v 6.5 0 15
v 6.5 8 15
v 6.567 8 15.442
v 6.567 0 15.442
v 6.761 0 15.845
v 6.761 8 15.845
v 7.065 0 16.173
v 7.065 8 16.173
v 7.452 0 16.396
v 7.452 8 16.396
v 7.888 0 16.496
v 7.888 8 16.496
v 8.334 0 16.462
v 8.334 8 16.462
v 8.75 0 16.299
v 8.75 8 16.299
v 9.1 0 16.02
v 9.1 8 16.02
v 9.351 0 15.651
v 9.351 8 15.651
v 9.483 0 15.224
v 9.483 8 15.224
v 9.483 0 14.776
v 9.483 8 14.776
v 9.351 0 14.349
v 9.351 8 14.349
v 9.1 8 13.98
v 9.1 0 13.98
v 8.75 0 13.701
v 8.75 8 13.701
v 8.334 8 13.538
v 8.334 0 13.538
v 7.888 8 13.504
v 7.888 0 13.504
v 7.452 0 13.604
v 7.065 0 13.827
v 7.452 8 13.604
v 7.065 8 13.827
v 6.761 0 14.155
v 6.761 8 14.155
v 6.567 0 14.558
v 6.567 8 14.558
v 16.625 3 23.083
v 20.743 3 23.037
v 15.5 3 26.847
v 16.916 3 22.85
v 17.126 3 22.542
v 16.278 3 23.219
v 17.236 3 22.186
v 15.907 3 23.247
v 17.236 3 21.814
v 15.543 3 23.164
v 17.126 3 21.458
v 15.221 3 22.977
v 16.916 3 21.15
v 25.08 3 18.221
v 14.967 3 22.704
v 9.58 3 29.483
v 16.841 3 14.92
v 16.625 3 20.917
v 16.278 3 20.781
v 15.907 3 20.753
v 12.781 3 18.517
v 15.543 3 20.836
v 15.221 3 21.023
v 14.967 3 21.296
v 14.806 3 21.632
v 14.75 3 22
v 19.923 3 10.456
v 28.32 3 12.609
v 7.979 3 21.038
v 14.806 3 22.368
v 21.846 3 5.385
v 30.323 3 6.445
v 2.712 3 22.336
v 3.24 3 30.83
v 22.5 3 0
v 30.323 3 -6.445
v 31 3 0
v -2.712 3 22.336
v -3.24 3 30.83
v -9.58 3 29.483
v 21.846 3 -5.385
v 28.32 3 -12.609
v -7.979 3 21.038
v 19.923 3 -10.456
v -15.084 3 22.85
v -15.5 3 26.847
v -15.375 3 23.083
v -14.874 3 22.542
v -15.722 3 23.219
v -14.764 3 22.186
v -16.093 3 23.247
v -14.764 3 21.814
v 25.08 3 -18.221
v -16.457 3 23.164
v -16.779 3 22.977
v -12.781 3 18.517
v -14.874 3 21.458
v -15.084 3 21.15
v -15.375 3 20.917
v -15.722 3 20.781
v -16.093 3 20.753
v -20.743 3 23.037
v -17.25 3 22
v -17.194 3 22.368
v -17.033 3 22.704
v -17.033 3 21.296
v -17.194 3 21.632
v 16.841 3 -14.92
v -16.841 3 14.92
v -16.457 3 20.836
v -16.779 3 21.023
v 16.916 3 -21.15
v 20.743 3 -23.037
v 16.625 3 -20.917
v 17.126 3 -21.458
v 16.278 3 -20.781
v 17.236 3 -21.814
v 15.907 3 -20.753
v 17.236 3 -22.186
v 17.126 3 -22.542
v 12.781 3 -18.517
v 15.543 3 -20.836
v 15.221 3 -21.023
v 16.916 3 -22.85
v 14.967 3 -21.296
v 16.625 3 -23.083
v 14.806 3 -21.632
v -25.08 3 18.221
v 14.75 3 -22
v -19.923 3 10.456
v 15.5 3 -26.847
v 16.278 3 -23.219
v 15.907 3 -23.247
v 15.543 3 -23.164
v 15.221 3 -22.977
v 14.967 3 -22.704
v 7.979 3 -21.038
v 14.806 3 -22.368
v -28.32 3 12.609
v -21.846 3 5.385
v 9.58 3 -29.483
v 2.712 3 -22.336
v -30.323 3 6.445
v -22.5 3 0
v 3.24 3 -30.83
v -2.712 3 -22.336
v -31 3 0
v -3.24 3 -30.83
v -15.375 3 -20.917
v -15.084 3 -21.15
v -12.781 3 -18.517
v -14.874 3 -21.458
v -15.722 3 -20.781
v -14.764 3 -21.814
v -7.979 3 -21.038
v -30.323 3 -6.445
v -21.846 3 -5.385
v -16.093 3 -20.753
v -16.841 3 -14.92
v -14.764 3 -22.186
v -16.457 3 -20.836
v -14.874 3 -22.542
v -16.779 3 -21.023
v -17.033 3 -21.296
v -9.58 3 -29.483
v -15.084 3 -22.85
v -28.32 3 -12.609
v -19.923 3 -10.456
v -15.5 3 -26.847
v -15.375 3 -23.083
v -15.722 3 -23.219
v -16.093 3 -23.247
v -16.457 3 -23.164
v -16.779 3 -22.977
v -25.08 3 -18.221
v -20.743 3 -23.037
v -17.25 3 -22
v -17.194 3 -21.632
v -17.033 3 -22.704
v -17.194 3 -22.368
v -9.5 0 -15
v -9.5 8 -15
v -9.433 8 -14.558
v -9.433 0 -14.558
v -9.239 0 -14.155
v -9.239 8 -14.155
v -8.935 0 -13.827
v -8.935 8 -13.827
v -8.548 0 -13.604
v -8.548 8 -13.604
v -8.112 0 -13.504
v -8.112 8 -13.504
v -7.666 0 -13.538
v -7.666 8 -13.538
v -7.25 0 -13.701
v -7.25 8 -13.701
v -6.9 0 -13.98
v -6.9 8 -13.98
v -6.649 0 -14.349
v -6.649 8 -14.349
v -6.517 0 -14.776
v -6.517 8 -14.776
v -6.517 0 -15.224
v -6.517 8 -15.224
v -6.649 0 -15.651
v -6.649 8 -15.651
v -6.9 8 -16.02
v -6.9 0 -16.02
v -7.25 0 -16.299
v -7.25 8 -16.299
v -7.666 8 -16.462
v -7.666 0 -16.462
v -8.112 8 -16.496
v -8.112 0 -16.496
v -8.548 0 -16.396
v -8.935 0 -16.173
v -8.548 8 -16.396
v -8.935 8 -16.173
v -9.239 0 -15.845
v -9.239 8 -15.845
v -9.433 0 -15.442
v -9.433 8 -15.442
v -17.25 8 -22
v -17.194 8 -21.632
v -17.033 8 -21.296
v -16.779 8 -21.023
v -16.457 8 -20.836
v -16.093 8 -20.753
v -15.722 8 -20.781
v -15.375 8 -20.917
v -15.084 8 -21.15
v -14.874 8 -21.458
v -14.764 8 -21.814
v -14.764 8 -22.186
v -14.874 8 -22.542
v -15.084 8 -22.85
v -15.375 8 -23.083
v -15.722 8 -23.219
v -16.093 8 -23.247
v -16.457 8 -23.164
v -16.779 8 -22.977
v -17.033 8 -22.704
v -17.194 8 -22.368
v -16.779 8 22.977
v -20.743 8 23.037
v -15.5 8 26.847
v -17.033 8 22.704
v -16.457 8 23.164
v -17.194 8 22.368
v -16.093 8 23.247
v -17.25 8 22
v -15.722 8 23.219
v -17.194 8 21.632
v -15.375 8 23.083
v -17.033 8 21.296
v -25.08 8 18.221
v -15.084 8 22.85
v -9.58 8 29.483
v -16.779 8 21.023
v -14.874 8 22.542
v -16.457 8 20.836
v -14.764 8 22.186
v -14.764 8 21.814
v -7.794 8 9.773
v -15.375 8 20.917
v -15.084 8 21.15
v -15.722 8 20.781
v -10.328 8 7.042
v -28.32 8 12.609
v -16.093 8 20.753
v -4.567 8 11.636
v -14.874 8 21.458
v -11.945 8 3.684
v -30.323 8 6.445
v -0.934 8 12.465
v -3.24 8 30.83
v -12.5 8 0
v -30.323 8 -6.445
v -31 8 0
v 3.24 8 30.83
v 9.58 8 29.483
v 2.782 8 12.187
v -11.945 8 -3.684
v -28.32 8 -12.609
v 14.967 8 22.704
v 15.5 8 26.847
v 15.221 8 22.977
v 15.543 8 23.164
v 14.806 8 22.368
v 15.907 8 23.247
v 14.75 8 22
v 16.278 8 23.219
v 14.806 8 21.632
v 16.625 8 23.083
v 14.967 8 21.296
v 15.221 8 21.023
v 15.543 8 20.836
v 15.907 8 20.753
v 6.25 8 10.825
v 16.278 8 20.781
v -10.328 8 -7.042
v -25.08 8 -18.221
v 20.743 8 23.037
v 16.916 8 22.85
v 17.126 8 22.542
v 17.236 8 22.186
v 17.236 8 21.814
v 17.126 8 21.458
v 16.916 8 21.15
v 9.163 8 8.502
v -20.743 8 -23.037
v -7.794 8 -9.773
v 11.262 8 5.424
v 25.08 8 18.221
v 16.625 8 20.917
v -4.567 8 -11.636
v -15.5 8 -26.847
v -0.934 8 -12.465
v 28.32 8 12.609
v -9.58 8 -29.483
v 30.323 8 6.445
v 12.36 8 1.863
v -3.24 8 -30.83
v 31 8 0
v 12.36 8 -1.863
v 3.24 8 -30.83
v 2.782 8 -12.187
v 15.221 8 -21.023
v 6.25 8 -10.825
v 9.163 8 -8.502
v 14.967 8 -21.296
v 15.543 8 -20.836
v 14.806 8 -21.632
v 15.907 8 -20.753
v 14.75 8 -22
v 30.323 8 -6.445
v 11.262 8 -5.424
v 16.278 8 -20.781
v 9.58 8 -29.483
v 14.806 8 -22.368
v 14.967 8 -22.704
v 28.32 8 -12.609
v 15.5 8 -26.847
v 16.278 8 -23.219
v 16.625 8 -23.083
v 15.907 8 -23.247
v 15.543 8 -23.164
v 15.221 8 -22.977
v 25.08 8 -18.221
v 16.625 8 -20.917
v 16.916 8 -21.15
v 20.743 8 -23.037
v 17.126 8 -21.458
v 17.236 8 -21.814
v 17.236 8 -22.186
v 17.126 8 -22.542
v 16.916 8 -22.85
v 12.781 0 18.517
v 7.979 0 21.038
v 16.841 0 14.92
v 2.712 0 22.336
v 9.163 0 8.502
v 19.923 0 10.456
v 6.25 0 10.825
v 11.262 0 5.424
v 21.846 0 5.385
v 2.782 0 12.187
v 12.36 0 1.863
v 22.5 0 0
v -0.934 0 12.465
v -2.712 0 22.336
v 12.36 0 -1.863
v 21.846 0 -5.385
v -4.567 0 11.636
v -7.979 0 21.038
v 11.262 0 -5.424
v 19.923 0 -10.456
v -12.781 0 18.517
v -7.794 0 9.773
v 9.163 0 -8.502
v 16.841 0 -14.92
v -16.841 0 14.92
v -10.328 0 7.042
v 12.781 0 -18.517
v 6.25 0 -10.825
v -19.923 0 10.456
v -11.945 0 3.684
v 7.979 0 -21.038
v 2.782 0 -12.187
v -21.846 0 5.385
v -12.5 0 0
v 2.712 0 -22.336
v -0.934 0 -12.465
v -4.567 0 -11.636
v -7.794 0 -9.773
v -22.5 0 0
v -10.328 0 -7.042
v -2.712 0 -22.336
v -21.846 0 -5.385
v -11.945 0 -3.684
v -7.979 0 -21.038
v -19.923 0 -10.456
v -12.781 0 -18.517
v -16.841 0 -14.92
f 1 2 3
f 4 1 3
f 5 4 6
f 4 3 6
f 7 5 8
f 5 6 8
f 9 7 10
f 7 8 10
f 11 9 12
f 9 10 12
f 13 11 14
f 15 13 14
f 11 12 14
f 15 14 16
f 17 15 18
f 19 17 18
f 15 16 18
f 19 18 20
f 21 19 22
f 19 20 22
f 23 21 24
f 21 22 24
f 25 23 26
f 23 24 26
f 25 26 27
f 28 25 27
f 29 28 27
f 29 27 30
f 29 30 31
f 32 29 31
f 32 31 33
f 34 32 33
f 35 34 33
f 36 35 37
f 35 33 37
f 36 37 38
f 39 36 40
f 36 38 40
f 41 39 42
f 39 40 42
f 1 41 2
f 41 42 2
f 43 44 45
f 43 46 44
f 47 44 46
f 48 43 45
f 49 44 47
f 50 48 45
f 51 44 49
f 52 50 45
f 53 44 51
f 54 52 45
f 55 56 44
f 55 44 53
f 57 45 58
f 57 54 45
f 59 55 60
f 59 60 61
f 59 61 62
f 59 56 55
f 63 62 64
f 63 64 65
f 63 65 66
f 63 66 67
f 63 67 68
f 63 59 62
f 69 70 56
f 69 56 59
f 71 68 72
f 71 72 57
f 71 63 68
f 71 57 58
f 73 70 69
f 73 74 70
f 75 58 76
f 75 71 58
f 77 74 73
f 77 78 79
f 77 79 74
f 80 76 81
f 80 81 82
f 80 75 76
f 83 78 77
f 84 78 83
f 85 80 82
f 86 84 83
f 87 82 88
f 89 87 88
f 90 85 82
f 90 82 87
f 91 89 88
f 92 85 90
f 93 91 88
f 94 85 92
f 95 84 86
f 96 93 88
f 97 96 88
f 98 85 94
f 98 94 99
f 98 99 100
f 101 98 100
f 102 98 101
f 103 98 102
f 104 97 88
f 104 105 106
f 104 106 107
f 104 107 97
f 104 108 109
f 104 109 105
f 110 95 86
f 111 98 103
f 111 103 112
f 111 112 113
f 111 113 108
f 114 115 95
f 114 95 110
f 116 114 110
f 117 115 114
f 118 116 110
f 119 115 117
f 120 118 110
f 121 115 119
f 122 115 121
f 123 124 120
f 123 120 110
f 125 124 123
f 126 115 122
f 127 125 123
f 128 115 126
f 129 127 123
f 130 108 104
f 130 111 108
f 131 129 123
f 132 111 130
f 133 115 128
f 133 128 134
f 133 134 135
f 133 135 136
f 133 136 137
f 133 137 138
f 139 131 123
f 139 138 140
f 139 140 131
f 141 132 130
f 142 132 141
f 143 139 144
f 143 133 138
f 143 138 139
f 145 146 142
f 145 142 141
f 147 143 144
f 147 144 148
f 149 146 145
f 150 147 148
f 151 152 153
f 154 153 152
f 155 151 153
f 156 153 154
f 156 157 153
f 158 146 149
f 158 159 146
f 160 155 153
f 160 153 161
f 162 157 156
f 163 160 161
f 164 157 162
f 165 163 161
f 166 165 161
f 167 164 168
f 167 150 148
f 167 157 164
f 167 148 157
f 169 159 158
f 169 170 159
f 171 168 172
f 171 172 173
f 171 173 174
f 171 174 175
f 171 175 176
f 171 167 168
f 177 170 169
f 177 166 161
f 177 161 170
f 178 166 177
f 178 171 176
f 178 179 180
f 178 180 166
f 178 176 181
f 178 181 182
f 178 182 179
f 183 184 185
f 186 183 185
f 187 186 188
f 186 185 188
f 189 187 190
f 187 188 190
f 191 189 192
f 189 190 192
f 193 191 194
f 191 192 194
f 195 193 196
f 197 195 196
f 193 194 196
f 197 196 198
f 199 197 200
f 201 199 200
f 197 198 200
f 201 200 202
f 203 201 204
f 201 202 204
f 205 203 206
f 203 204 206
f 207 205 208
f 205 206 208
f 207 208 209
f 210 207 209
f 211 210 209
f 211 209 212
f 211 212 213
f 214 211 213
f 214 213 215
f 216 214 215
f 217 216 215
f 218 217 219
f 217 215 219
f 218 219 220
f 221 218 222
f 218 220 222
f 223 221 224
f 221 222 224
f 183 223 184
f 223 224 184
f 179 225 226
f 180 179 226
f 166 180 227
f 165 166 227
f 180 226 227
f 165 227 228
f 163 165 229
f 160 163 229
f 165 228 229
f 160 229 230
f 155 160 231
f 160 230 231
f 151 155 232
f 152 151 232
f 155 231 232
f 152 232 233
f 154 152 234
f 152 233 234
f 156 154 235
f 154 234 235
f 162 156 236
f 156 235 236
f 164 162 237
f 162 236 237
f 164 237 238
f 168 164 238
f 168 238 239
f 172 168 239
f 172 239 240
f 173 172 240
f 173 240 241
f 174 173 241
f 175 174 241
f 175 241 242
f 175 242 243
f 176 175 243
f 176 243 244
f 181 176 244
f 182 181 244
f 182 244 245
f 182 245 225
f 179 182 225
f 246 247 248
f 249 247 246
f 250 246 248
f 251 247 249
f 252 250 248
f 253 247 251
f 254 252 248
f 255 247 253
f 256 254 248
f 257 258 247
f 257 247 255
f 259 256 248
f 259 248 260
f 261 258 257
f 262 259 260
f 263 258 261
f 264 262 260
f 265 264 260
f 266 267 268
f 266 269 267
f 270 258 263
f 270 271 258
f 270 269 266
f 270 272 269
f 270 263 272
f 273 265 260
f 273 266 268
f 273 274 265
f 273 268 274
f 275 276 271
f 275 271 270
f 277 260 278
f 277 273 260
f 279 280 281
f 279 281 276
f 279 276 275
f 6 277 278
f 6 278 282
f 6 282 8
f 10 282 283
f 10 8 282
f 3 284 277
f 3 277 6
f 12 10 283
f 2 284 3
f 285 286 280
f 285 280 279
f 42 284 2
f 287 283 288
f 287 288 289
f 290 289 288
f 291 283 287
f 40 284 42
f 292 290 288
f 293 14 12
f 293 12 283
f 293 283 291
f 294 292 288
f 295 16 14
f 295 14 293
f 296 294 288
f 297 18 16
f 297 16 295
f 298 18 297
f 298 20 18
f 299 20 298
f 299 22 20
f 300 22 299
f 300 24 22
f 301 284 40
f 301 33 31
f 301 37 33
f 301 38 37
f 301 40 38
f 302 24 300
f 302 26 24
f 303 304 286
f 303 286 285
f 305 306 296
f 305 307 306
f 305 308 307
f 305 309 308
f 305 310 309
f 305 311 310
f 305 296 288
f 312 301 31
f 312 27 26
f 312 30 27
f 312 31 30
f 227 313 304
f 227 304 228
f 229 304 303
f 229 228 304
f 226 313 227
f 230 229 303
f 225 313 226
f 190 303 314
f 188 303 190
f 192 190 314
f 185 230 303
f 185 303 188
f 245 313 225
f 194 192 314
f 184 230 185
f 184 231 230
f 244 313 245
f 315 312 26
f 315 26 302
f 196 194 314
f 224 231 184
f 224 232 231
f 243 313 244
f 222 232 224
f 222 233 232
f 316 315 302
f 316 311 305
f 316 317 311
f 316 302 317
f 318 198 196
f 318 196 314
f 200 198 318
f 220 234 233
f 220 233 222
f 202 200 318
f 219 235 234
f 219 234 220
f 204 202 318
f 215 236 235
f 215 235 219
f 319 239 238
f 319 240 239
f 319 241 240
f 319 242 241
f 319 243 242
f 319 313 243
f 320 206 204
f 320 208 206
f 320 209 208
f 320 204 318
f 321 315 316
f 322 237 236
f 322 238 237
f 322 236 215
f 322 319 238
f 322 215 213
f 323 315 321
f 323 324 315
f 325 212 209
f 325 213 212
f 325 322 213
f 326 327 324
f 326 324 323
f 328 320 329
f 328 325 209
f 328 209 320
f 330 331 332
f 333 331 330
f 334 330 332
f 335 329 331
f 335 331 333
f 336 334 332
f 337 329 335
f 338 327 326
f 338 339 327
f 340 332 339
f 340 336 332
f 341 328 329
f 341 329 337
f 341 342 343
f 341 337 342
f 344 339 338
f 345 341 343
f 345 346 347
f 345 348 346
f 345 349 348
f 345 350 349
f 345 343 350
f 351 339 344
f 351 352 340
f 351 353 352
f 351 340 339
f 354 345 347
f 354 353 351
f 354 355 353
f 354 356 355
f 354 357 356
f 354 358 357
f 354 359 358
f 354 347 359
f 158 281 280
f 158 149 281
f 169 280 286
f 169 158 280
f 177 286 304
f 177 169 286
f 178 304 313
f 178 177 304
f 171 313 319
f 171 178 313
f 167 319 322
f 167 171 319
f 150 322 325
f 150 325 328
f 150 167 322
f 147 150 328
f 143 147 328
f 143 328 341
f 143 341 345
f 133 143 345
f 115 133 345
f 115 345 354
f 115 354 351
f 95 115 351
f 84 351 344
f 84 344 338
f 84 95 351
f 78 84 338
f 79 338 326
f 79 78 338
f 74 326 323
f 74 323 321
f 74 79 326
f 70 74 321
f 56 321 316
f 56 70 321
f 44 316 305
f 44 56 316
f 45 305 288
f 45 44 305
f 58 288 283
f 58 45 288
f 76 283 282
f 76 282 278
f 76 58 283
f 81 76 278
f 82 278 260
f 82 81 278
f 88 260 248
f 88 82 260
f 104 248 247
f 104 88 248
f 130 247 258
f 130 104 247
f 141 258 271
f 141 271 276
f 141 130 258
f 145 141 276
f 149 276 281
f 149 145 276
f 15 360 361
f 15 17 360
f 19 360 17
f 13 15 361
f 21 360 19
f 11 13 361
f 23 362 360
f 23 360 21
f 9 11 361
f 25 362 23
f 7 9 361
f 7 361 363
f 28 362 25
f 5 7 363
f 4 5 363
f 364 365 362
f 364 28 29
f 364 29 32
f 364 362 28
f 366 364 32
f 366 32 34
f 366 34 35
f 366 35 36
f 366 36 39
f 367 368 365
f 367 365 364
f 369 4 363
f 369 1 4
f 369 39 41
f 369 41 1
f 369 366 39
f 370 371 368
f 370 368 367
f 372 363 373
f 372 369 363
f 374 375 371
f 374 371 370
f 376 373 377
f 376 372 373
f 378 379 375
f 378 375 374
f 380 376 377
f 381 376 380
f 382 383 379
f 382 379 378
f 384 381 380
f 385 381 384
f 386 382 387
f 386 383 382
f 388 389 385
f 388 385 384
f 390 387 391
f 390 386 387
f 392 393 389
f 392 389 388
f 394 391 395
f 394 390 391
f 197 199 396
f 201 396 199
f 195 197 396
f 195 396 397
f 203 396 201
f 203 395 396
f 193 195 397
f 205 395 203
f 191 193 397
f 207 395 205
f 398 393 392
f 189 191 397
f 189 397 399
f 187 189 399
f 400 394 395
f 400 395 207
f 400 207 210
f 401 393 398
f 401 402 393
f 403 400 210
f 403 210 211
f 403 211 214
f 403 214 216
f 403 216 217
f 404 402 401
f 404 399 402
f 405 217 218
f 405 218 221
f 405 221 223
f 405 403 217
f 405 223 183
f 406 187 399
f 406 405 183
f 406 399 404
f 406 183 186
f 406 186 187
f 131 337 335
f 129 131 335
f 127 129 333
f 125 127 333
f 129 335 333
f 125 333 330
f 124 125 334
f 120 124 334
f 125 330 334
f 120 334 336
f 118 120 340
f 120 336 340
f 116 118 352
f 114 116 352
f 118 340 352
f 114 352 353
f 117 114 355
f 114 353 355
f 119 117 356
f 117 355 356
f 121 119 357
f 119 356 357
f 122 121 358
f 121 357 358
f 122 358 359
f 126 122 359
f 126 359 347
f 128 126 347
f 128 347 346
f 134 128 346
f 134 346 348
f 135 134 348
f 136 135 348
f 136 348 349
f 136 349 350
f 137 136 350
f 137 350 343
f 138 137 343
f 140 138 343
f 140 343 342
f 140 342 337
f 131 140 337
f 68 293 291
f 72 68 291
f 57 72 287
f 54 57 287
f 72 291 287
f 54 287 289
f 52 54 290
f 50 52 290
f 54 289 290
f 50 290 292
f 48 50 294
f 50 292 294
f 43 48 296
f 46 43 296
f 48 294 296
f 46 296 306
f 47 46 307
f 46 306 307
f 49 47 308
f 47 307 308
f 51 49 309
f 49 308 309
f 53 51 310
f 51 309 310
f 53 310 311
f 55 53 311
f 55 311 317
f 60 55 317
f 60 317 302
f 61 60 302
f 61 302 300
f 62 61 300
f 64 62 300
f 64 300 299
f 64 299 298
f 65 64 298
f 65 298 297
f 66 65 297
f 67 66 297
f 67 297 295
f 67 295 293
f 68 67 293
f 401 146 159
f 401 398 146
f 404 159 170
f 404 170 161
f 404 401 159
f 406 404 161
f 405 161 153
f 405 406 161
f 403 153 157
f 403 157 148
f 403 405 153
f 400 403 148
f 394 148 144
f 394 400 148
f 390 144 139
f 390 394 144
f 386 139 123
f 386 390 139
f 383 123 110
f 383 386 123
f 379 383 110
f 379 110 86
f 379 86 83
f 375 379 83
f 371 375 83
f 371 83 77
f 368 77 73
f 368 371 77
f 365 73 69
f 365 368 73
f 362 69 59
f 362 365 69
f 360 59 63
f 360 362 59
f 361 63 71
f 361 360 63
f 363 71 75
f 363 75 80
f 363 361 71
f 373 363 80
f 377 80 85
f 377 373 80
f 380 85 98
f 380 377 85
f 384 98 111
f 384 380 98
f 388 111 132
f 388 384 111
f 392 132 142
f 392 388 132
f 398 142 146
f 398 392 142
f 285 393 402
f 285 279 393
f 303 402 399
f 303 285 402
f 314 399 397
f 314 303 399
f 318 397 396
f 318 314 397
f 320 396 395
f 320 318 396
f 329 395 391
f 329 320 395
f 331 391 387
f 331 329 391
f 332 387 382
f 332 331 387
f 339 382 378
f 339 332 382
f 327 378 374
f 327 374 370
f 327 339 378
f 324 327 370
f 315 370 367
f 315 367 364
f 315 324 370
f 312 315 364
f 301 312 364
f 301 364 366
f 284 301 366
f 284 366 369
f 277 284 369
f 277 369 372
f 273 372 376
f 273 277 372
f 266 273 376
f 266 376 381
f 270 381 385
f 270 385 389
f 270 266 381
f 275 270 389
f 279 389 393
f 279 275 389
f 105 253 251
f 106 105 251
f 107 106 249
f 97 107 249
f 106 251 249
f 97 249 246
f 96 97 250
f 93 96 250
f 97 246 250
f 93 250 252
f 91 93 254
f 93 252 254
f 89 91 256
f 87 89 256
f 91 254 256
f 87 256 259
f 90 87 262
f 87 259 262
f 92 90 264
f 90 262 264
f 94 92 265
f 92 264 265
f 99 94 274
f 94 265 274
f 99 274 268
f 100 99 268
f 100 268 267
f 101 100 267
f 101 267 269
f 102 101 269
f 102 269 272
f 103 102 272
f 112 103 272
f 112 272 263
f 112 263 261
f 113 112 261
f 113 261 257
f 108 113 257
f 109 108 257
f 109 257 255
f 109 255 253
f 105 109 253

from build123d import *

# Parameters (mm, degrees)
ESQUISSE2_R             = 1.25
ESQUISSE2_R_2           = 1.5
ENL_V_MAT_EXTRU_1_DEPTH = 8


with BuildPart() as part:
    # Esquisse1 → Révolution1 (revolve)
    with BuildSketch(Plane.XY):
        Polygon((-12.5, 8), (-31, 8), (-31, 3), (-22.5, 3), (-22.5, 0), (-12.5, 0), (-12.5, 7.91388756), align=None)
    revolve(axis=Axis((0, 10, 0), (0, -1, 0)))

    # Esquisse2 → Enlèv. mat.-Extru.1 (cut)
    with BuildSketch(Plane(origin=(0, 8, 0), x_dir=(1, 0, 0), z_dir=(0, 1, 0))):
        with Locations(Location((-16, 22, 0), (0, 0, 180))):
            Circle(ESQUISSE2_R)
        with Locations(Location((16, 22, 0), (0, 0, 180))):
            Circle(ESQUISSE2_R)
        with Locations(Location((16, -22, 0), (0, 0, 180))):
            Circle(ESQUISSE2_R)
        with Locations(Location((-16, -22, 0), (0, 0, 180))):
            Circle(ESQUISSE2_R)
        with Locations(Location((-8, 15, 0), (0, 0, 180))):
            Circle(ESQUISSE2_R_2)
        with Locations(Location((8, -15, 0), (0, 0, 180))):
            Circle(ESQUISSE2_R_2)
    extrude(amount=-ENL_V_MAT_EXTRU_1_DEPTH, mode=Mode.SUBTRACT)


solid = part.part
